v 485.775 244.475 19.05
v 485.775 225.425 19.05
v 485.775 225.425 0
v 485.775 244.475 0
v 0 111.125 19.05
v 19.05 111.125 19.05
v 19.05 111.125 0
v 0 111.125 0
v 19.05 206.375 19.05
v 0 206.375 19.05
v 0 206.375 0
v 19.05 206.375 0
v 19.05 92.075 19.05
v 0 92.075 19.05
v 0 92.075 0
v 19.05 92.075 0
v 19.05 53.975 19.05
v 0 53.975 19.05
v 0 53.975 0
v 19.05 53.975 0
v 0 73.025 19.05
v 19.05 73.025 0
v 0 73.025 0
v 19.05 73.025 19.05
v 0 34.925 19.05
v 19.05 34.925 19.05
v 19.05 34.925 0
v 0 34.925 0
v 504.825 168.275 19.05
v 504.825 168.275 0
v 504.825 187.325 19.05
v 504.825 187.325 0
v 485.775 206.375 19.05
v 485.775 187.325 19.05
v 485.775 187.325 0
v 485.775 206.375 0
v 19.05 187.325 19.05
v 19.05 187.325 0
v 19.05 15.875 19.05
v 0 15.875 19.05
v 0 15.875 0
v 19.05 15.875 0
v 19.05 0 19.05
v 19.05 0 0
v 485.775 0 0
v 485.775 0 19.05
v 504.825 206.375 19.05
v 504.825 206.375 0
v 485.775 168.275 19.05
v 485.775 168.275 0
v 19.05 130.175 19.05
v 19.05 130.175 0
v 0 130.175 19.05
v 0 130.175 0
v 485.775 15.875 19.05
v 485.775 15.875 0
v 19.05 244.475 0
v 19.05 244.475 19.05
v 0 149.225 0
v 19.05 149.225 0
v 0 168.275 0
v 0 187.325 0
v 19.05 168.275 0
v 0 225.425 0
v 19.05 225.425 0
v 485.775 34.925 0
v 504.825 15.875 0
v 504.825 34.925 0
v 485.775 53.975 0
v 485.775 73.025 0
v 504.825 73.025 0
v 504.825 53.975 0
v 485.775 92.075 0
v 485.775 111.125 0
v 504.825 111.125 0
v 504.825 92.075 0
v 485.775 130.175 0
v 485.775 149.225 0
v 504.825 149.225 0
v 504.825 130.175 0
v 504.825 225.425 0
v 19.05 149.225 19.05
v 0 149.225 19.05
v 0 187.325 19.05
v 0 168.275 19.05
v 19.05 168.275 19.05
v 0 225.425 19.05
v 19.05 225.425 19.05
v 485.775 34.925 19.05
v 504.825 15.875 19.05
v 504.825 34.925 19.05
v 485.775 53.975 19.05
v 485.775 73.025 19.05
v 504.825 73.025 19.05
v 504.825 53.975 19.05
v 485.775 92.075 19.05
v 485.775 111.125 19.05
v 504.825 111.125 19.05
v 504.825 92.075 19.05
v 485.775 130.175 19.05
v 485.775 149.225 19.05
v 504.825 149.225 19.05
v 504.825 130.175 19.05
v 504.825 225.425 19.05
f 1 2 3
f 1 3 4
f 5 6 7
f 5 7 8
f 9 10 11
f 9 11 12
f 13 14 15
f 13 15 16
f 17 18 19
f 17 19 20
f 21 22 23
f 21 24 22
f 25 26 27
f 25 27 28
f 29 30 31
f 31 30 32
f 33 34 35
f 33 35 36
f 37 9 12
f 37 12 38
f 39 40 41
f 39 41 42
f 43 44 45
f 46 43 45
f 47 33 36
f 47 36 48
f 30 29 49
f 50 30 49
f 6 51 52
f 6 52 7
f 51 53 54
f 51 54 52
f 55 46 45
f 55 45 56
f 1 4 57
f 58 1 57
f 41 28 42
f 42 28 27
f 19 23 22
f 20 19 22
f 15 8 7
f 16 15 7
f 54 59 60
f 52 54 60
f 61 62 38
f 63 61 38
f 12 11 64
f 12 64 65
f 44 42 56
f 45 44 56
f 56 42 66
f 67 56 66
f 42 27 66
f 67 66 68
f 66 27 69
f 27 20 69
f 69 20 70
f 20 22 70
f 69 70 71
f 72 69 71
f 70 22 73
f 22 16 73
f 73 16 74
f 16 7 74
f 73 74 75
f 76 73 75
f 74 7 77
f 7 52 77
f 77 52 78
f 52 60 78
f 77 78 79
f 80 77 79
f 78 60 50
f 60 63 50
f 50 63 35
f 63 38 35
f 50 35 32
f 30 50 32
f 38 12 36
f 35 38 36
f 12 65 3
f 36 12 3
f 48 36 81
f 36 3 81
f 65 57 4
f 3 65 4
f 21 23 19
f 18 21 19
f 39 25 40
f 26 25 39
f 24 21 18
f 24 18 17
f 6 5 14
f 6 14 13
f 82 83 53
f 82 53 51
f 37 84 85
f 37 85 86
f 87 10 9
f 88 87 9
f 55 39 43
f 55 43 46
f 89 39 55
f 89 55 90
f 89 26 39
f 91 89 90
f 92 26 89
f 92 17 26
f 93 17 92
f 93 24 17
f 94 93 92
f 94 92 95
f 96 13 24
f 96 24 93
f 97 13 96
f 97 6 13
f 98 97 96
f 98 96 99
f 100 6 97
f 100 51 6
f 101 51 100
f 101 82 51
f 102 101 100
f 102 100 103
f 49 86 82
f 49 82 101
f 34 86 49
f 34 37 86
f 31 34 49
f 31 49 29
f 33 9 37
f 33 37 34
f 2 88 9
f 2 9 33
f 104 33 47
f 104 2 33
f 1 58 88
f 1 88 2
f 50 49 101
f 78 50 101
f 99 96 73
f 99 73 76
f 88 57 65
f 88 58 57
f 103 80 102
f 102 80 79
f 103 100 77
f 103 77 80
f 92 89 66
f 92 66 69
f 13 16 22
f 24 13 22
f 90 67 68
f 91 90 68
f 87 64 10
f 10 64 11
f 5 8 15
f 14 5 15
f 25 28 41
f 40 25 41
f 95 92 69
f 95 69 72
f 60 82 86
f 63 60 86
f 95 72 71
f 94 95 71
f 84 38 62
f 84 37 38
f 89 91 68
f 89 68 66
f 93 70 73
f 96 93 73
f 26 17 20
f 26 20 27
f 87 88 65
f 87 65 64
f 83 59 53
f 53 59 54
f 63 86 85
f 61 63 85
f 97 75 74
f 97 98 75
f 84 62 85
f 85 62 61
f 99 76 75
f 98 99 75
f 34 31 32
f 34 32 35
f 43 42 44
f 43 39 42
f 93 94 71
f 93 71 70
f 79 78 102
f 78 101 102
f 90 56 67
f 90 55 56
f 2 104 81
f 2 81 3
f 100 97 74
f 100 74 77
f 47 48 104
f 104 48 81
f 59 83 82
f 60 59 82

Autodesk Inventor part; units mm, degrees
ref_plane "YZ Plane" through (0, 0, 0) normal (1, 0, 0) x (0, 1, 0)
ref_plane "XZ Plane" through (0, 0, 0) normal (0, 1, 0) x (-1, 0, 0)
ref_plane "XY Plane" through (0, 0, 0) normal (0, 0, 1) x (1, 0, 0)
sketch "Sketch1" plane through (0, 0, 0) normal (0, 0, 1) x (1, 0, 0)
  line L0 (0, 0) -> (252.4125, 0)
  line L1 (252.4125, 0) -> (252.4125, 244.475)
  line L2 (252.4125, 244.475) -> (0, 244.475)
  line L3 (0, 244.475) -> (0, 0)
  dimension "d0" = 252.4125
  dimension "d1" = 244.475
extrude "Extrusion1" add sketch "Sketch1" along normal blind 19.05
sketch "Sketch3" plane through (0, 0, 19.05) normal (0, 0, 1) x (1, 0, 0)
  line L0 (0, 0) -> (252.4125, 0) projected
  line L1 (252.4125, 244.475) -> (0, 244.475) projected
  line L2 (0, 244.475) -> (0, 0) projected
  line L3 (0, 244.475) -> (19.05, 244.475)
  line L4 (19.05, 244.475) -> (19.05, 225.425)
  line L5 (19.05, 225.425) -> (0, 225.425)
  line L6 (0, 225.425) -> (0, 244.475)
  line L7 (19.05, 168.275) -> (0, 168.275)
  line L8 (0, 168.275) -> (0, 149.225)
  line L9 (0, 149.225) -> (19.05, 149.225)
  line L10 (19.05, 149.225) -> (19.05, 168.275)
  line L11 (0, 130.175) -> (19.05, 130.175)
  line L12 (19.05, 130.175) -> (19.05, 111.125)
  line L13 (19.05, 111.125) -> (0, 111.125)
  line L14 (0, 111.125) -> (0, 130.175)
  line L15 (0, 206.375) -> (19.05, 206.375)
  line L16 (19.05, 206.375) -> (19.05, 187.325)
  line L17 (19.05, 187.325) -> (0, 187.325)
  line L18 (0, 187.325) -> (0, 206.375)
  line L19 (0, 92.075) -> (19.05, 92.075)
  line L20 (19.05, 92.075) -> (19.05, 73.025)
  line L21 (19.05, 73.025) -> (0, 73.025)
  line L22 (0, 73.025) -> (0, 92.075)
  line L23 (0, 53.975) -> (19.05, 53.975)
  line L24 (19.05, 53.975) -> (19.05, 34.925)
  line L25 (19.05, 34.925) -> (0, 34.925)
  line L26 (0, 34.925) -> (0, 53.975)
  line L27 (0, 15.875) -> (19.05, 15.875)
  line L28 (19.05, 15.875) -> (19.05, -3.175)
  line L29 (19.05, -3.175) -> (0, -3.175)
  line L30 (0, -3.175) -> (0, 15.875)
  dimension "d4" = 19.05
  dimension "d5" = 19.05
  dimension "d6" = 244.475
  dimension "d7" = 19.05
  dimension "d8" = 19.05
  dimension "d9" = 19.05
  dimension "d10" = 19.05
  dimension "d11" = 19.05
  dimension "d12" = 19.05
  dimension "d13" = 19.05
  dimension "d14" = 19.05
  dimension "d15" = 19.05
  dimension "d16" = 19.05
  dimension "d17" = 19.05
  dimension "d18" = 19.05
  dimension "d19" = 19.05
  dimension "d20" = 19.05
  dimension "d21" = 19.05
  dimension "d22" = 19.05
  dimension "d23" = 19.05
  dimension "d24" = 15.875
extrude "Extrusion2" cut sketch "Sketch3" against normal through all
mirror "Mirror1" about plane through (252.4125, 0, 0) normal (1, 0, 0)
properties part number "deep_side" material "Wood (Birch)"
